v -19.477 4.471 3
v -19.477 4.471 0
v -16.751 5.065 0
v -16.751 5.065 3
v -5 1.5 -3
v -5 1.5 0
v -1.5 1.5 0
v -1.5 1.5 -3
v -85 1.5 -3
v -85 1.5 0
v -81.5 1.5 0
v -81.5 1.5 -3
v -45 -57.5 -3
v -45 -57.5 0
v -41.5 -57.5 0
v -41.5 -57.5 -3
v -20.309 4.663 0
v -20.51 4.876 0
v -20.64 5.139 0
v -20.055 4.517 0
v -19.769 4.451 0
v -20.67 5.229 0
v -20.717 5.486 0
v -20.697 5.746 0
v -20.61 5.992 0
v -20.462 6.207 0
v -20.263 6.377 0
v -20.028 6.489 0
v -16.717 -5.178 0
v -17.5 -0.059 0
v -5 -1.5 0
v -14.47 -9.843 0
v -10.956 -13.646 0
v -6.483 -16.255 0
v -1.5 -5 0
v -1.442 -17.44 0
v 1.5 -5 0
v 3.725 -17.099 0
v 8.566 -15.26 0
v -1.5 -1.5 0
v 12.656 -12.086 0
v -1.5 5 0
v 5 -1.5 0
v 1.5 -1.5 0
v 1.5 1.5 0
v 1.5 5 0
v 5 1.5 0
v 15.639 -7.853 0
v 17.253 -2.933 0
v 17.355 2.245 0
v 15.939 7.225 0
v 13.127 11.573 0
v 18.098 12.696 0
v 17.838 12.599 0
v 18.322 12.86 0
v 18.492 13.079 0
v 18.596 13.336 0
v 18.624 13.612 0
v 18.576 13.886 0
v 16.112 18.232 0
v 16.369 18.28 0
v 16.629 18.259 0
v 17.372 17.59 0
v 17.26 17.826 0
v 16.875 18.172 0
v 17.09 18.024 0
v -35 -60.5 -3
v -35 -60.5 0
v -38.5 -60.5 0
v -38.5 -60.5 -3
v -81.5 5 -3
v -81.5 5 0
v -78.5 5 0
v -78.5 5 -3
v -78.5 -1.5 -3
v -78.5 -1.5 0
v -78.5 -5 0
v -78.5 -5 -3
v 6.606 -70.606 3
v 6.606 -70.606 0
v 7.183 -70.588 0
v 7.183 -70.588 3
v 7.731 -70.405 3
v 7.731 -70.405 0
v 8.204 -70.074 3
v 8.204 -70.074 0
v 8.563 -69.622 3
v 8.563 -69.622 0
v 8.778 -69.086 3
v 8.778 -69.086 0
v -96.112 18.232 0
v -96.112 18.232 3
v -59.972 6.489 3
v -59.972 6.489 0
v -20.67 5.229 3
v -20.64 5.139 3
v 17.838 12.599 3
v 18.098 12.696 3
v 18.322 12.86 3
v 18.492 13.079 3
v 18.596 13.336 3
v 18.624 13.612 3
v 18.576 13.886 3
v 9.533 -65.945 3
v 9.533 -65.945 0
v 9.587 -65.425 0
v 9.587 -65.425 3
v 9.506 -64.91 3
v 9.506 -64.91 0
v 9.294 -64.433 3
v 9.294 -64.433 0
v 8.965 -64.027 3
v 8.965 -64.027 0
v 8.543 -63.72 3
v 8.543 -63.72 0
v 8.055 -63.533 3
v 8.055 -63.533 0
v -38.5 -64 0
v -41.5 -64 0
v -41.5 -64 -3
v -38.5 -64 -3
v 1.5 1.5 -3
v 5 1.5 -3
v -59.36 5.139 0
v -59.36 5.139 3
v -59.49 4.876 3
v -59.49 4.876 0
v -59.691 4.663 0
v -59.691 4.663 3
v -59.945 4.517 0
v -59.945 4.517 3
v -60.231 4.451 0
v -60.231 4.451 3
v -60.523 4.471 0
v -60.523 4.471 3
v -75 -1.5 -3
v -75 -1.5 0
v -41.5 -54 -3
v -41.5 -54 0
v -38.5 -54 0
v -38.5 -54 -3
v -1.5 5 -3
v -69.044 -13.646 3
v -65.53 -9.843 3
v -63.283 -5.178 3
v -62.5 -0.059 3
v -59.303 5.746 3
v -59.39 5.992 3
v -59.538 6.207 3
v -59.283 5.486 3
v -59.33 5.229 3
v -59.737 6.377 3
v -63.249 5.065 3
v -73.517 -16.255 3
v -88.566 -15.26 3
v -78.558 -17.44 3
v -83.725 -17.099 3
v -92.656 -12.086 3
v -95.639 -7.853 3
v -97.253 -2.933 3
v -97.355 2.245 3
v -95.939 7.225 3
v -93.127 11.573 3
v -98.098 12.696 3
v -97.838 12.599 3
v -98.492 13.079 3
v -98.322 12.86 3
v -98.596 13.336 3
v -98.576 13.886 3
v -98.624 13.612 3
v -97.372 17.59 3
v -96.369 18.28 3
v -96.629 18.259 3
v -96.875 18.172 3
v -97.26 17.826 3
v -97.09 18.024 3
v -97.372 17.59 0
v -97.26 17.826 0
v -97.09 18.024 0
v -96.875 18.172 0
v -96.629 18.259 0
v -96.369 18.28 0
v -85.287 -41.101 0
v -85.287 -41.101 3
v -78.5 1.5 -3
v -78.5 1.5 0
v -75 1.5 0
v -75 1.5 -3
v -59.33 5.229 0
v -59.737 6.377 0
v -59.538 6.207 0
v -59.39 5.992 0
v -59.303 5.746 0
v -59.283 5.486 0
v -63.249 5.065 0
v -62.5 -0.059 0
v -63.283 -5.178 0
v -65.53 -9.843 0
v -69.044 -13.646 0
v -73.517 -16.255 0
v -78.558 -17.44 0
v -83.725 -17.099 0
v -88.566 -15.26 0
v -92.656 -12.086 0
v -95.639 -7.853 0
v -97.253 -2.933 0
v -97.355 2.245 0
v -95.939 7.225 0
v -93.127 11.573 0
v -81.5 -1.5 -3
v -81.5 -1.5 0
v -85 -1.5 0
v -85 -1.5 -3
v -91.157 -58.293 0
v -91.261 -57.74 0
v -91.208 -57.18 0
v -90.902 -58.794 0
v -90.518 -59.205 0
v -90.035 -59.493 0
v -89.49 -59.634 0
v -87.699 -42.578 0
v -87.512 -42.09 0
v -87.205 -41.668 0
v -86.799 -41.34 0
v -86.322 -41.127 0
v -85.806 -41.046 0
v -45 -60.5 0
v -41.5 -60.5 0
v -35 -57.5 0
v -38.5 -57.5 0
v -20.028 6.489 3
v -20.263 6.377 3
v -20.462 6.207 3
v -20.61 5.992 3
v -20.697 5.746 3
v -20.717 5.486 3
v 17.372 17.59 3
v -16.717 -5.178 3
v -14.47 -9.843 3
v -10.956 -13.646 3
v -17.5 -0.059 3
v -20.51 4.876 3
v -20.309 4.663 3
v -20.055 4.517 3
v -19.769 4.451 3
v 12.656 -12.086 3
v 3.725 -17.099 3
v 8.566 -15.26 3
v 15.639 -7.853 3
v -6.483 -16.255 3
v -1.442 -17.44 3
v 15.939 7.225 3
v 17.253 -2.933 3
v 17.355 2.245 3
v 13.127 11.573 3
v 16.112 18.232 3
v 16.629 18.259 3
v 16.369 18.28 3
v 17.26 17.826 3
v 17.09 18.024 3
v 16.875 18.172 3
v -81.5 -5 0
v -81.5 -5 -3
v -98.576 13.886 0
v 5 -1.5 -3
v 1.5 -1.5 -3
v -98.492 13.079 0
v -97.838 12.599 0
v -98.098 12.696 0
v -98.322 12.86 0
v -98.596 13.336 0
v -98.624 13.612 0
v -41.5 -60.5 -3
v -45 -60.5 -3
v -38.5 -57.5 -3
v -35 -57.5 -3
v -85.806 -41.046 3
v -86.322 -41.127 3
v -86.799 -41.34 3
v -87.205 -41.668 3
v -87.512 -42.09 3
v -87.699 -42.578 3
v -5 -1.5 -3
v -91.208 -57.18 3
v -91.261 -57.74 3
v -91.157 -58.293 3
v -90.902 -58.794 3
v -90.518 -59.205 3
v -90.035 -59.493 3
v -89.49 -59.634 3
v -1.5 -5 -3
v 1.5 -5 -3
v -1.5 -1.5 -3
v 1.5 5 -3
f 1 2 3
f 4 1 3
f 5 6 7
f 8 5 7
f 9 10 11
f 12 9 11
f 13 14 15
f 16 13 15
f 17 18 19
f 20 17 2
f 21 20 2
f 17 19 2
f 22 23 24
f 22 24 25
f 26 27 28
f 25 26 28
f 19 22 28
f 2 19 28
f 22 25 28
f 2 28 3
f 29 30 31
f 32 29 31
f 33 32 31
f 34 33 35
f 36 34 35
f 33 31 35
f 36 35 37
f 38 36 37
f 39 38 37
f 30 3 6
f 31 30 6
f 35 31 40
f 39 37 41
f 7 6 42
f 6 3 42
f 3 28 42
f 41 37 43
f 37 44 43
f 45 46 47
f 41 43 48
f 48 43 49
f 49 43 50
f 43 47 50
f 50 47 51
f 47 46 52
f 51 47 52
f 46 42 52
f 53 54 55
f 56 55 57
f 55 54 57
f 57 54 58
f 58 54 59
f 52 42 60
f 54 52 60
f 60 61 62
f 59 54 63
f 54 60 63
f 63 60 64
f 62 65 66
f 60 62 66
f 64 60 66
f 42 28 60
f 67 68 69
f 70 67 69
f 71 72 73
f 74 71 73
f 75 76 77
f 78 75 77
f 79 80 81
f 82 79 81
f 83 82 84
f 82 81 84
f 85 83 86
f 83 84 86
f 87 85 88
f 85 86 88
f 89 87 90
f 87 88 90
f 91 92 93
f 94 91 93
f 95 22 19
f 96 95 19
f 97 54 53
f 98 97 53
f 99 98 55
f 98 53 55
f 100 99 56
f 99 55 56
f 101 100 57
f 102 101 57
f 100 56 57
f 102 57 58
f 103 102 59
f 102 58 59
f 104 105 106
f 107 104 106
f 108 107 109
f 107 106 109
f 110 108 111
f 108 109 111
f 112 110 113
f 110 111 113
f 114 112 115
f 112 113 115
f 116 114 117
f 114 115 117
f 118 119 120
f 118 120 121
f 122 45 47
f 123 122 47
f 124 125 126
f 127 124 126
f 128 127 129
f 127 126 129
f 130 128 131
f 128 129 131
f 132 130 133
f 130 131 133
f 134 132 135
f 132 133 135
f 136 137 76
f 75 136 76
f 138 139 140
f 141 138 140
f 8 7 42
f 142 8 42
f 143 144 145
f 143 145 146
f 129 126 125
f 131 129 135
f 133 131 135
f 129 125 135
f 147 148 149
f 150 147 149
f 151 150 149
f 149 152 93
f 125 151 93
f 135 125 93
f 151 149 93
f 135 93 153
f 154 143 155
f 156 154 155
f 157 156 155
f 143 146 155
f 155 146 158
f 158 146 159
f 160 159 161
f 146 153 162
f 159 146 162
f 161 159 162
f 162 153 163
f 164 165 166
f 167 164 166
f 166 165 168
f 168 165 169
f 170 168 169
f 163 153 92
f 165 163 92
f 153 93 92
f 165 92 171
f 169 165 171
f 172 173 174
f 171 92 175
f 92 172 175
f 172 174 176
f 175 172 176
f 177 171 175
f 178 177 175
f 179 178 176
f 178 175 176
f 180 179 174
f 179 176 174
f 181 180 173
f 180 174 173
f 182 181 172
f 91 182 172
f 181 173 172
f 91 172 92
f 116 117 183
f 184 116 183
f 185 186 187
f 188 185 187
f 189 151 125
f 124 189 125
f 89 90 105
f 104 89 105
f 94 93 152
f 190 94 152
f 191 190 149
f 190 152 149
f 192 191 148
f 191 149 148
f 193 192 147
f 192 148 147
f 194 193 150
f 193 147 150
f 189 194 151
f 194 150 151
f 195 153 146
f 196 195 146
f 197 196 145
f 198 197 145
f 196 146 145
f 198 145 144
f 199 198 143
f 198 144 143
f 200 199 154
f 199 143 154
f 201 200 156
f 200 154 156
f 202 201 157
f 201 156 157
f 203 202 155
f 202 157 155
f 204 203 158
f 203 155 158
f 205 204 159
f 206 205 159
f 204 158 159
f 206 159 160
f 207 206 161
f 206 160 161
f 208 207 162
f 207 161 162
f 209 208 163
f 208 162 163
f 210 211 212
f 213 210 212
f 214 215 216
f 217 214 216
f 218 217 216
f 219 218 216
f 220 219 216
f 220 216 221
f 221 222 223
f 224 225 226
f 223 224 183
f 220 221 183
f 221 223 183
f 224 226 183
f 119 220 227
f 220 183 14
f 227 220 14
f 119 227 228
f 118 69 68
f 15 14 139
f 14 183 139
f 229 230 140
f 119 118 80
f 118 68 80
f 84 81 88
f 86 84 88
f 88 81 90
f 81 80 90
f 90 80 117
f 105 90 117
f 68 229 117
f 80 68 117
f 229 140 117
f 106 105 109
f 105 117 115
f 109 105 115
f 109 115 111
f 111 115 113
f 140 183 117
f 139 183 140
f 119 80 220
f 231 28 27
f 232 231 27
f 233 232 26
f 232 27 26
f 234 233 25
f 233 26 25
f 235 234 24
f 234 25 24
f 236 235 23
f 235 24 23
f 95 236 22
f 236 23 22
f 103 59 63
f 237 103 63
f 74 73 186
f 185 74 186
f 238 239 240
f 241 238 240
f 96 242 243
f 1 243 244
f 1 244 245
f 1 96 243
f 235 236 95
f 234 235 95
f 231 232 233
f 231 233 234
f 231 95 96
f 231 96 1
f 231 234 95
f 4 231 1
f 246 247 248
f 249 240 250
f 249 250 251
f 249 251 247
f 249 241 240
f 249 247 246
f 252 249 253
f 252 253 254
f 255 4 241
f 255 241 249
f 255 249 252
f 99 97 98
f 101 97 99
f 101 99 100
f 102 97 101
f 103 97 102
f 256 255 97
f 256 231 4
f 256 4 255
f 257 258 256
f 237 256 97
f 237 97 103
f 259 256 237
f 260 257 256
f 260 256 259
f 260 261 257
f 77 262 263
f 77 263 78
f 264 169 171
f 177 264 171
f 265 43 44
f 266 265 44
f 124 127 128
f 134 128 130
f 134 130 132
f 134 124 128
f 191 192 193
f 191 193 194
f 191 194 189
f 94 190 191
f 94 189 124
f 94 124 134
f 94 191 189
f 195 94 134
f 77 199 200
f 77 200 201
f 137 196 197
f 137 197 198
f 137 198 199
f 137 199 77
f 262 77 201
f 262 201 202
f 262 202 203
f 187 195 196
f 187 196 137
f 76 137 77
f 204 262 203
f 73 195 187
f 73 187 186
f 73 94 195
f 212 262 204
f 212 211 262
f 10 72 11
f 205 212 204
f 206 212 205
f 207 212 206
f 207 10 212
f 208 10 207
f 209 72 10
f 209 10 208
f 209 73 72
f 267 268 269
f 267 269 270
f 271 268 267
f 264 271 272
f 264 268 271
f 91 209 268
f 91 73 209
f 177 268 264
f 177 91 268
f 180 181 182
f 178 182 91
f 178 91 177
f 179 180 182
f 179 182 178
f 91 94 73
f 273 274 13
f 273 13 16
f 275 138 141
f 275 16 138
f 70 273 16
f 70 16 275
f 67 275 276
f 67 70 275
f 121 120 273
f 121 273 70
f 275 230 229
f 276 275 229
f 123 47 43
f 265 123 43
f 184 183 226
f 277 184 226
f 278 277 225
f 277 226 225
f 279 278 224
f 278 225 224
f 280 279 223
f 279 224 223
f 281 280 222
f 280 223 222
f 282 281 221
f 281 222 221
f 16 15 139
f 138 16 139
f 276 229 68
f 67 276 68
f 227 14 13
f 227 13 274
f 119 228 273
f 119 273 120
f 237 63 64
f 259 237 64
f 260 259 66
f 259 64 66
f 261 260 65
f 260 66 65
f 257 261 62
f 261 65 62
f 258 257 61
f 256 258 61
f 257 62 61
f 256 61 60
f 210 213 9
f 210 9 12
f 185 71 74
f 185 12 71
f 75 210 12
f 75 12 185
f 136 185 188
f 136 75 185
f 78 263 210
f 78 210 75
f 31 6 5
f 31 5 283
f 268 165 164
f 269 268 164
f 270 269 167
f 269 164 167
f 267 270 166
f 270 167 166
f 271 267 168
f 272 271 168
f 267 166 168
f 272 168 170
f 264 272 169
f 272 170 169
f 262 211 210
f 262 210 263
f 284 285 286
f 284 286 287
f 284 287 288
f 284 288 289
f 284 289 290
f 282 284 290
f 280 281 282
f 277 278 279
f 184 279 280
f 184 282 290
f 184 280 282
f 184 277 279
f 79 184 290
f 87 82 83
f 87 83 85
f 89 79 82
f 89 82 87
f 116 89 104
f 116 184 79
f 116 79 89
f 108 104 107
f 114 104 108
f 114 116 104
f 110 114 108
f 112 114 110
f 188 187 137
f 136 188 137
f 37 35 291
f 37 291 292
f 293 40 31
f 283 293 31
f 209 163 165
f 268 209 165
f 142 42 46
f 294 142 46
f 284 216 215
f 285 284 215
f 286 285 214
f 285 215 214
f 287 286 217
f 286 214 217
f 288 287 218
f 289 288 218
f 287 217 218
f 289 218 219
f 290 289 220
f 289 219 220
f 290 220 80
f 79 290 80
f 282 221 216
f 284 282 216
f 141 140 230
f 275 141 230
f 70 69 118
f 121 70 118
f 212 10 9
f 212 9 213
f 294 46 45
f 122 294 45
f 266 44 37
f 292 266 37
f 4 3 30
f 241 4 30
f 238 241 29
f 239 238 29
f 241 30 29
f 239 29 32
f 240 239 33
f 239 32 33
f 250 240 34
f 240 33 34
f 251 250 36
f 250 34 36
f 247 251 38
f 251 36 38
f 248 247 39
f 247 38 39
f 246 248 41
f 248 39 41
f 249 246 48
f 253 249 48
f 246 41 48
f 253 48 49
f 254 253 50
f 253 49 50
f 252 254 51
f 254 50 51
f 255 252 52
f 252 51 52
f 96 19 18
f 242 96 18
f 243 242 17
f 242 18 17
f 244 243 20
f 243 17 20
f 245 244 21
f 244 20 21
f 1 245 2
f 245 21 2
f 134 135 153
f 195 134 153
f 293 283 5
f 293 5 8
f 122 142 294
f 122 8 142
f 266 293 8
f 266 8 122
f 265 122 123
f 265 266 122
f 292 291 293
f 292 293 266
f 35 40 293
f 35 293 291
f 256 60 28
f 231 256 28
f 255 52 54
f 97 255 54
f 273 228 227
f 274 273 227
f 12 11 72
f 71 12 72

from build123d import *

# Parameters (mm, degrees)
F1_DEPTH = 3
F2_DEPTH = 3
F3_ANGLE = 180
F5_W     = 3
F5_H     = 3.5
F5_H_2   = 3
F5_W_2   = 3.5
F6_DEPTH = 3


with BuildPart() as f1:
    # F0 (on Top) → F1 (new body)
    with BuildSketch(Plane.XY):
        with BuildLine():
            Line((-19.476585964, 4.4708532235), (-16.7511225031, 5.0645725276))
            ThreePointArc((-16.7511225031, 5.0645725276), (3.7248704752, -17.098986518), (13.1267215086, 11.573209686))
            Line((13.1267215086, 11.573209686), (17.8378262338, 12.5994842478))
            ThreePointArc((17.8378262338, 12.5994842478), (18.4922619086, 13.0787579756), (18.5760330087, 13.8855861861))
            Line((18.5760330087, 13.8855861861), (17.3724079721, 17.5899631462))
            ThreePointArc((17.3724079721, 17.5899631462), (16.8753419555, 18.171952676), (16.1123344614, 18.2320026681))
            Line((16.1123344614, 18.2320026681), (-20.0278131578, 6.4893568819))
            ThreePointArc((-20.0278131578, 6.4893568819), (-20.6098026876, 5.9922908653), (-20.6698526797, 5.2292833712))
            Line((-20.6698526797, 5.2292833712), (-20.6404922217, 5.138921173))
            ThreePointArc((-20.6404922217, 5.138921173), (-20.1872469216, 4.5806527512), (-19.476585964, 4.4708532235))
        make_face()
    extrude(amount=F1_DEPTH)


with BuildPart() as f1b:
    # F0 (on Top) → F1, piece 2 (new body)
    with BuildSketch(Plane.XY):
        with BuildLine():
            Line((8.0553670353, -63.5326643258), (-85.2870152727, -41.1005519625))
            ThreePointArc((-85.2870152727, -41.1005519625), (-86.7989578789, -41.3396655466), (-87.6989839117, -42.577849253))
            Line((-87.6989839117, -42.577849253), (-91.2081764859, -57.179969176))
            ThreePointArc((-91.2081764859, -57.179969176), (-90.9021100367, -58.794082847), (-89.4904046035, -59.6343967075))
            Line((-89.4904046035, -59.6343967075), (6.606294771, -70.6055056455))
            ThreePointArc((6.606294771, -70.6055056455), (7.9799338502, -70.2569803038), (8.7777888182, -69.0857494624))
            Line((8.7777888182, -69.0857494624), (9.5326643258, -65.9446329647))
            ThreePointArc((9.5326643258, -65.9446329647), (9.2935507417, -64.4326903586), (8.0553670353, -63.5326643258))
        make_face()
    extrude(amount=F1_DEPTH)



with BuildPart() as f2:
    # F0 (on Top) → F2 (new body)
    with BuildSketch(Plane.XY):
        with BuildLine():
            Line((-19.476585964, 4.4708532235), (-16.7511225031, 5.0645725276))
            ThreePointArc((-16.7511225031, 5.0645725276), (3.7248704752, -17.098986518), (13.1267215086, 11.573209686))
            Line((13.1267215086, 11.573209686), (17.8378262338, 12.5994842478))
            ThreePointArc((17.8378262338, 12.5994842478), (18.4922619086, 13.0787579756), (18.5760330087, 13.8855861861))
            Line((18.5760330087, 13.8855861861), (17.3724079721, 17.5899631462))
            ThreePointArc((17.3724079721, 17.5899631462), (16.8753419555, 18.171952676), (16.1123344614, 18.2320026681))
            Line((16.1123344614, 18.2320026681), (-20.0278131578, 6.4893568819))
            ThreePointArc((-20.0278131578, 6.4893568819), (-20.6098026876, 5.9922908653), (-20.6698526797, 5.2292833712))
            Line((-20.6698526797, 5.2292833712), (-20.6404922217, 5.138921173))
            ThreePointArc((-20.6404922217, 5.138921173), (-20.1872469216, 4.5806527512), (-19.476585964, 4.4708532235))
        make_face()
    extrude(amount=F2_DEPTH)


with BuildPart() as f2b:
    # F0 (on Top) → F2, piece 2 (new body)
    with BuildSketch(Plane.XY):
        with BuildLine():
            Line((8.0553670353, -63.5326643258), (-85.2870152727, -41.1005519625))
            ThreePointArc((-85.2870152727, -41.1005519625), (-86.7989578789, -41.3396655466), (-87.6989839117, -42.577849253))
            Line((-87.6989839117, -42.577849253), (-91.2081764859, -57.179969176))
            ThreePointArc((-91.2081764859, -57.179969176), (-90.9021100367, -58.794082847), (-89.4904046035, -59.6343967075))
            Line((-89.4904046035, -59.6343967075), (6.606294771, -70.6055056455))
            ThreePointArc((6.606294771, -70.6055056455), (7.9799338502, -70.2569803038), (8.7777888182, -69.0857494624))
            Line((8.7777888182, -69.0857494624), (9.5326643258, -65.9446329647))
            ThreePointArc((9.5326643258, -65.9446329647), (9.2935507417, -64.4326903586), (8.0553670353, -63.5326643258))
        make_face()
    extrude(amount=F2_DEPTH)


with BuildPart() as f3_1:
    # F3: copy of F1
    add(f1.part.rotate(Axis((-40, -25.4947505891, 0), (0, 1, 0)), F3_ANGLE))


with BuildPart() as f3_1_1:
    # F4: moved
    add(f3_1.part.moved(Location((0, 0, 3))))

    # F5 (on face) → F6, piece 2 (join)
    with BuildSketch(Plane(origin=(0, 0, 0), x_dir=(1, 0, 0), z_dir=(0, 0, -1))):
        with Locations((-80, -3.25)):
            Rectangle(F5_W, F5_H)
        with Locations((-76.75, 0)):
            Rectangle(F5_W_2, F5_H_2)
        with Locations((-80, 0)):
            Rectangle(F5_W, F5_H_2)
        with Locations((-83.25, 0)):
            Rectangle(F5_W_2, F5_H_2)
        with Locations((-80, 3.25)):
            Rectangle(F5_W, F5_H)
    extrude(amount=F6_DEPTH)


with BuildPart() as f1_1:
    add(f1.part)

    add(f2.part)  # F6 merges F2
    # F5 (on face) → F6 (join)
    with BuildSketch(Plane(origin=(0, 0, 0), x_dir=(1, 0, 0), z_dir=(0, 0, -1))):
        with Locations((0, -3.25)):
            Rectangle(F5_W, F5_H)
        Rectangle(F5_W, F5_H_2)
        with Locations((3.25, 0)):
            Rectangle(F5_W_2, F5_H_2)
        with Locations((-3.25, 0)):
            Rectangle(F5_W_2, F5_H_2)
        with Locations((0, 3.25)):
            Rectangle(F5_W, F5_H)
    extrude(amount=F6_DEPTH)


with BuildPart() as f1b_1:
    add(f1b.part)

    add(f2b.part)  # F6#3 merges F2b
    # F5 (on face) → F6, piece 3 (join)
    with BuildSketch(Plane(origin=(0, 0, 0), x_dir=(1, 0, 0), z_dir=(0, 0, -1))):
        with Locations((-40, 55.75)):
            Rectangle(F5_W, F5_H)
        with Locations((-40, 59)):
            Rectangle(F5_W, F5_H_2)
        with Locations((-36.75, 59)):
            Rectangle(F5_W_2, F5_H_2)
        with Locations((-43.25, 59)):
            Rectangle(F5_W_2, F5_H_2)
        with Locations((-40, 62.25)):
            Rectangle(F5_W, F5_H)
    extrude(amount=F6_DEPTH)


solid = Compound([f3_1_1.part, f1_1.part, f1b_1.part])
